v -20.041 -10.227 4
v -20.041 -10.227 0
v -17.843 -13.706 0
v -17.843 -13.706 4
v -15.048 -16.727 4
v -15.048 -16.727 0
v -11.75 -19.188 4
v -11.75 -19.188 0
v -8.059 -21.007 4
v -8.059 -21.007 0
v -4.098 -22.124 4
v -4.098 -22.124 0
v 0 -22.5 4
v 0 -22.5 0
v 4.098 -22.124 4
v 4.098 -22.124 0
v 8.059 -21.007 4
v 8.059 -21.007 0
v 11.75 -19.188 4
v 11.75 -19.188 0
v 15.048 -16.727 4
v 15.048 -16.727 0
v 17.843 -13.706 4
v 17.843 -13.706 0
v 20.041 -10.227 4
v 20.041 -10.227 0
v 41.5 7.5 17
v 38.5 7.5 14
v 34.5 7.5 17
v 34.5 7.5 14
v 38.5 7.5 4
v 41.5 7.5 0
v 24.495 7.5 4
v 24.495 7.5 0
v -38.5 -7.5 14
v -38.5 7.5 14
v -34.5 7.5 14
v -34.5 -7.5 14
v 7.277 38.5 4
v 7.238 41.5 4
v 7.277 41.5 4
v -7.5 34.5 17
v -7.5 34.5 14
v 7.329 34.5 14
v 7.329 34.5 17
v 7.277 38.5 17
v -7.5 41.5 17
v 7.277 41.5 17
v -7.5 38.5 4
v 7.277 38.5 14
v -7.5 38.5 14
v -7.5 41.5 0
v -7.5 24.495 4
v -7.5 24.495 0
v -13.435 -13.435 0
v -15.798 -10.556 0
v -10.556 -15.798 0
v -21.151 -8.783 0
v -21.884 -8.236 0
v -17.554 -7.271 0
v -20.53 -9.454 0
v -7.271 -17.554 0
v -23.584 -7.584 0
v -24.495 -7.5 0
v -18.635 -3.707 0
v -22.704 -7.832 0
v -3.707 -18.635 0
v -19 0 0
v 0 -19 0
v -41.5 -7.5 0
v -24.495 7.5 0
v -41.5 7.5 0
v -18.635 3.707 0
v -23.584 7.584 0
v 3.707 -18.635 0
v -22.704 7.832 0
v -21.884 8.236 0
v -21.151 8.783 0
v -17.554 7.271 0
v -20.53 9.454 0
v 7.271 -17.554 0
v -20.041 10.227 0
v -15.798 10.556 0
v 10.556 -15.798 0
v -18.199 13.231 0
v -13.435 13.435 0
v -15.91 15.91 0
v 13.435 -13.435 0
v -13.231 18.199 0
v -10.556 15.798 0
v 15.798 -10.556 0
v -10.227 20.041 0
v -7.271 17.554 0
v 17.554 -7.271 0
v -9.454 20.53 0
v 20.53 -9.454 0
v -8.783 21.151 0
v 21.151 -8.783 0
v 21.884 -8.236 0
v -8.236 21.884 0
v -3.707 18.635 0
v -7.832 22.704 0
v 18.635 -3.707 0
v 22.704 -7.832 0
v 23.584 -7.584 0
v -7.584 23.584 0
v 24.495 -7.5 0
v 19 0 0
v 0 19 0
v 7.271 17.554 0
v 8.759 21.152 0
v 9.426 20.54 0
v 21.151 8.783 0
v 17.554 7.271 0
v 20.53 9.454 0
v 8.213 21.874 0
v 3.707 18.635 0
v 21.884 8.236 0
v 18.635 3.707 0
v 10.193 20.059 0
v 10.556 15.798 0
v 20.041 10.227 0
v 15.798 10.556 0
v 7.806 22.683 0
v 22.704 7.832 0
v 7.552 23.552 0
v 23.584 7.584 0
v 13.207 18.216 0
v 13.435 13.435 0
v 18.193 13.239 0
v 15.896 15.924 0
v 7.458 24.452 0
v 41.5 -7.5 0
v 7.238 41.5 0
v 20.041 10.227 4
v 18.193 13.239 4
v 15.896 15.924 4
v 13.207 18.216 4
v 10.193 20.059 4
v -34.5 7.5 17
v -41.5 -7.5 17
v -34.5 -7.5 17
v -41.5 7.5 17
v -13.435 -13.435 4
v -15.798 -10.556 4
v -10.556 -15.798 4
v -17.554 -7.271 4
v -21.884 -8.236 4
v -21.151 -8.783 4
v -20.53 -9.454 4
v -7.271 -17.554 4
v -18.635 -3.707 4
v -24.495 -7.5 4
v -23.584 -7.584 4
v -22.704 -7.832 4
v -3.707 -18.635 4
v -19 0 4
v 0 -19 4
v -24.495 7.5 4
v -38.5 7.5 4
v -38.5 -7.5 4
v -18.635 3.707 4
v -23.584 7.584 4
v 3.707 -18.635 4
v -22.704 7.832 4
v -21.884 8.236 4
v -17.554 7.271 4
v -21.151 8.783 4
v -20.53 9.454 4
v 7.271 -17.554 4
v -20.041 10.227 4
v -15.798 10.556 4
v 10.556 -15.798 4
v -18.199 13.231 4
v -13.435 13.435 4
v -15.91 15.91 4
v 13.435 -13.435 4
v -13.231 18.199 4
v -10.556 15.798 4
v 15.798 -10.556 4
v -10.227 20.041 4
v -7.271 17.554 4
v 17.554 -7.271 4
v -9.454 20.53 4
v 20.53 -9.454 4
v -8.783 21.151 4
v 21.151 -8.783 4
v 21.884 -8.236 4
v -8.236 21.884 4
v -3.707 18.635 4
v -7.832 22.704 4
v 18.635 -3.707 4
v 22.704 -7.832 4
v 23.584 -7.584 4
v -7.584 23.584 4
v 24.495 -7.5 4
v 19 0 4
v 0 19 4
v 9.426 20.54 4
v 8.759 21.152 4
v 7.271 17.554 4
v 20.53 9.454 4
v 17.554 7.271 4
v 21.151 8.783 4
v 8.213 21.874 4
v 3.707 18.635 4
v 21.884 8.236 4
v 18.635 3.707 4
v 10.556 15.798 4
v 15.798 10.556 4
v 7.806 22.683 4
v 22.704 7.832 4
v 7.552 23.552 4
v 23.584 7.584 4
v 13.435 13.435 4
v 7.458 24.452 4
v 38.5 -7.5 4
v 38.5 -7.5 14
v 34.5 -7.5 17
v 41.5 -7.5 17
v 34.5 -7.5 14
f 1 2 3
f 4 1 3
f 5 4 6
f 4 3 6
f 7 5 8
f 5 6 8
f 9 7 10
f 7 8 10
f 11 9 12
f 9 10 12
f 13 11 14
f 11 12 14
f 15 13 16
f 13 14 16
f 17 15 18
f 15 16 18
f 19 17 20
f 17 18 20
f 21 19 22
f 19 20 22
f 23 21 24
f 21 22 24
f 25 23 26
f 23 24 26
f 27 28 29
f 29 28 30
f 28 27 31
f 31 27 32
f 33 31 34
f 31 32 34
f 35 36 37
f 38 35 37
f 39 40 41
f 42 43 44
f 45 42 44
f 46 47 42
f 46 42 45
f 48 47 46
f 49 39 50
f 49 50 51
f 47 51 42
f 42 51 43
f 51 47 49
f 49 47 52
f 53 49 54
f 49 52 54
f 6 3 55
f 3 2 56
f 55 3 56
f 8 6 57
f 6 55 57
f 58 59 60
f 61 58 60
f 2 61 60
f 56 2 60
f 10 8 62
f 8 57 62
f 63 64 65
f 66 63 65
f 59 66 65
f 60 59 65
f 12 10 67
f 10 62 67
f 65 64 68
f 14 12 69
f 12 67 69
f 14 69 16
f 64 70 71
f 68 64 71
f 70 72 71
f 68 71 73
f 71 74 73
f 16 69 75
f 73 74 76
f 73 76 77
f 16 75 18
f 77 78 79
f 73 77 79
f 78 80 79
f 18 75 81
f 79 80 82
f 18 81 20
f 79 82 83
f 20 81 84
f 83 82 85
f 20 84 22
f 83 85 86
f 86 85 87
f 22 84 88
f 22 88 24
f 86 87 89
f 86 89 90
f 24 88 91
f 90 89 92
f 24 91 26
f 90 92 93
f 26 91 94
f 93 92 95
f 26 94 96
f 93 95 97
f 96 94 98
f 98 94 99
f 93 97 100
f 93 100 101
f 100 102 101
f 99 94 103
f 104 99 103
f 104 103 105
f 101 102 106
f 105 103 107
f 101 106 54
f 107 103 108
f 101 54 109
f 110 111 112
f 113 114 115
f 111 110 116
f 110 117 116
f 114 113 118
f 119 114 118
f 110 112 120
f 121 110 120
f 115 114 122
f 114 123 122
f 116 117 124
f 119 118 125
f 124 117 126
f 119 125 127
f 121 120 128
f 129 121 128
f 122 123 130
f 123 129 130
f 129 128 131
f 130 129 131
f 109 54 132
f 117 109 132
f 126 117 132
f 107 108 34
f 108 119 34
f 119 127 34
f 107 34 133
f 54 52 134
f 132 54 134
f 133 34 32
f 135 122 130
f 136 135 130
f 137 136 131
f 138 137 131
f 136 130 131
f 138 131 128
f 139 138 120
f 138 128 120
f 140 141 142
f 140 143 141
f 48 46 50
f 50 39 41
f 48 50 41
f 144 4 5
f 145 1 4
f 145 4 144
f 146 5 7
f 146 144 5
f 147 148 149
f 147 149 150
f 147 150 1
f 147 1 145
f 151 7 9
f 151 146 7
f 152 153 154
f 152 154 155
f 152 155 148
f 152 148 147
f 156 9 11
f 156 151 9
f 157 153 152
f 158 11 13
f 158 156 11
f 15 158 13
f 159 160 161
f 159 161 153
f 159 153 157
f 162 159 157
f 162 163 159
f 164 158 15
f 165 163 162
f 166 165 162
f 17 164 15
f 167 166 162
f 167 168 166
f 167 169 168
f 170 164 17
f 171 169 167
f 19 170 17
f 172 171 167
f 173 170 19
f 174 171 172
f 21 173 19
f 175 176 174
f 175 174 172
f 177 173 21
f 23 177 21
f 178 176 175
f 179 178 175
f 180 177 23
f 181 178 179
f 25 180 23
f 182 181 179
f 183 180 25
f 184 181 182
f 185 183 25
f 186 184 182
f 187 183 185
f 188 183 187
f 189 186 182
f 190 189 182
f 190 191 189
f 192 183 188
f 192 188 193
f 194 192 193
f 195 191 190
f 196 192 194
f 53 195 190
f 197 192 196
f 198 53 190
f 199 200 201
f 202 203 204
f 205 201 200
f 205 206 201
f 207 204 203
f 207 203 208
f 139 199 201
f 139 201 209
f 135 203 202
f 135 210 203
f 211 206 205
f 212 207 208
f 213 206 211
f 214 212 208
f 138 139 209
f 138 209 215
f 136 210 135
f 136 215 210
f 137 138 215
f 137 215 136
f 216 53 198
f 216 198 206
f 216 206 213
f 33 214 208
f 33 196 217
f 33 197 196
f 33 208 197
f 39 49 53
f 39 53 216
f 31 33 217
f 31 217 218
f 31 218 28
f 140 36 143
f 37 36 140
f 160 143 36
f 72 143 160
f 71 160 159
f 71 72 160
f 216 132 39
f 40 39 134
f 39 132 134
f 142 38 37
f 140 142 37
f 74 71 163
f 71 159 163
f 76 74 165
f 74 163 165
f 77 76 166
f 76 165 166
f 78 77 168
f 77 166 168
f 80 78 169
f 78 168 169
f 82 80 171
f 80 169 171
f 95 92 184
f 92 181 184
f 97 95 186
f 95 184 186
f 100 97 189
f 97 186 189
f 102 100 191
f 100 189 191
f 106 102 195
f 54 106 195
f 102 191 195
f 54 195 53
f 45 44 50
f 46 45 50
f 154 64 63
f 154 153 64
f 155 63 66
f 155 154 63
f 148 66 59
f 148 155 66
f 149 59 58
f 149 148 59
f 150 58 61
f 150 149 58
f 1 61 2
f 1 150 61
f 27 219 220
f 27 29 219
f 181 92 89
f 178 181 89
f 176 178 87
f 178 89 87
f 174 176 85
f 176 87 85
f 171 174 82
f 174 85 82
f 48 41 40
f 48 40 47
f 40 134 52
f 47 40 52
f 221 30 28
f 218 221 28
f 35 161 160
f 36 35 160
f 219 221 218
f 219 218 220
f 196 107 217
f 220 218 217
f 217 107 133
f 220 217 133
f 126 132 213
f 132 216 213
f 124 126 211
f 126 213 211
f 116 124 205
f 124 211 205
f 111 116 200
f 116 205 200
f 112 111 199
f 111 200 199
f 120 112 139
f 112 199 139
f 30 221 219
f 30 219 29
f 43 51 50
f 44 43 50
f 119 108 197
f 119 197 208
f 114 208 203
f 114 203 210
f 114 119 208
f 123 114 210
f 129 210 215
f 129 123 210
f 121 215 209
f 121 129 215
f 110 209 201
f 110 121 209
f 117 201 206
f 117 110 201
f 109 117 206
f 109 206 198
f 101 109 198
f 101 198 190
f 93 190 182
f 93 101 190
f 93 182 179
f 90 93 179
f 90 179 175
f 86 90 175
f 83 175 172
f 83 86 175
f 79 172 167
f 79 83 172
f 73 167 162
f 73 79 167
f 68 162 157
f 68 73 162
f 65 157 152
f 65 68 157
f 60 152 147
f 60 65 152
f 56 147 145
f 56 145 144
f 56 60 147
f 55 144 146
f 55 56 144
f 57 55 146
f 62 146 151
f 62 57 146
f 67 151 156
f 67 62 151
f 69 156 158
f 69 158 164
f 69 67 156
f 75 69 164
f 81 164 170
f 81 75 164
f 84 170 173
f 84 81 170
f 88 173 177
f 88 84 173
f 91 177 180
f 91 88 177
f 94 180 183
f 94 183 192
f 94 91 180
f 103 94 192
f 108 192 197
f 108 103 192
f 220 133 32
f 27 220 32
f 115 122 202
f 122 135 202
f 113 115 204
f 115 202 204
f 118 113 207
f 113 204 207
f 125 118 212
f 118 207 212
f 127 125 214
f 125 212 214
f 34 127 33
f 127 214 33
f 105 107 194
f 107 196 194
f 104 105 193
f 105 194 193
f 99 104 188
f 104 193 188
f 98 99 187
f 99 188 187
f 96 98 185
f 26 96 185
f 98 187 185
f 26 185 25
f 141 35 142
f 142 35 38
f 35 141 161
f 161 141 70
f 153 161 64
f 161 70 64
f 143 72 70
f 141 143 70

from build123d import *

# Parameters (mm, degrees)
F0_R     = 19
F1_DEPTH = 4
F2_W     = 3
F2_H     = 15
F3_DEPTH = 13
F2_W_2   = 4
F4_DEPTH = 13
F5_R     = 5
F6_DEPTH = 10


with BuildPart() as f1:
    # F0 (on Top) → F1 (new body)
    with BuildSketch(Plane.XY):
        with BuildLine():
            Line((-41.5, -7.5), (-21.2132034356, -7.5))
            ThreePointArc((-21.2132034356, -7.5), (0, -22.5), (21.2132034356, -7.5))
            Line((21.2132034356, -7.5), (41.5, -7.5))
            Line((41.5, -7.5), (41.5, 7.5))
            Line((41.5, 7.5), (21.2132034356, 7.5))
            ThreePointArc((21.2132034356, 7.5), (15.9099025767, 15.9099025767), (7.5, 21.2132034356))
            Line((7.5, 21.2132034356), (7.238372093, 41.5))
            Line((7.238372093, 41.5), (-7.5, 41.5))
            Line((-7.5, 41.5), (-7.5, 21.2132034356))
            ThreePointArc((-7.5, 21.2132034356), (-15.9099025767, 15.9099025767), (-21.2132034356, 7.5))
            Line((-21.2132034356, 7.5), (-41.5, 7.5))
            Line((-41.5, 7.5), (-41.5, -7.5))
        make_face()
        Circle(F0_R, mode=Mode.SUBTRACT)
    extrude(amount=F1_DEPTH)

    # F2 (on face) → F3 (join)
    with BuildSketch(Plane.XY.offset(4)):
        Polygon((7.238372093, 41.5), (7.2770614799, 38.5), (7.2770614799, 41.5), align=None)
        with Locations((-40, 0)):
            Rectangle(F2_W, F2_H)
        with Locations((40, 0)):
            Rectangle(F2_W, F2_H)
        Polygon((-7.5, 41.5), (-7.5, 38.5), (7.2770614799, 38.5), (7.238372093, 41.5), align=None)
    extrude(amount=F3_DEPTH)

    # F2 (on face) → F4 (join)
    with BuildSketch(Plane.XY.offset(4)):
        with Locations((-36.5, 0)):
            Rectangle(F2_W_2, F2_H)
        with Locations((36.5, 0)):
            Rectangle(F2_W_2, F2_H)
        Polygon((-7.5, 38.5), (-7.5, 34.5), (7.3286473291, 34.5), (7.2770614799, 38.5), align=None)
    extrude(amount=F4_DEPTH)

    # F5
    f5_edges = [f1.edges().sort_by_distance(p)[0] for p in [
        (-21.213203, -7.5, 2),
        (21.213203, -7.5, 2),
        (21.213203, 7.5, 2),
        (7.5, 21.213203, 2),
        (-21.213203, 7.5, 2),
        (-7.5, 21.213203, 2),
    ]]
    fillet(f5_edges, radius=F5_R)

    # F2 (on face) → F6 (cut)
    with BuildSketch(Plane.XY.offset(4)):
        Polygon((-7.5, 38.5), (-7.5, 34.5), (7.3286473291, 34.5), (7.2770614799, 38.5), align=None)
        with Locations((-36.5, 0)):
            Rectangle(F2_W_2, F2_H)
        with Locations((36.5, 0)):
            Rectangle(F2_W_2, F2_H)
    extrude(amount=F6_DEPTH, mode=Mode.SUBTRACT)


solid = f1.part
